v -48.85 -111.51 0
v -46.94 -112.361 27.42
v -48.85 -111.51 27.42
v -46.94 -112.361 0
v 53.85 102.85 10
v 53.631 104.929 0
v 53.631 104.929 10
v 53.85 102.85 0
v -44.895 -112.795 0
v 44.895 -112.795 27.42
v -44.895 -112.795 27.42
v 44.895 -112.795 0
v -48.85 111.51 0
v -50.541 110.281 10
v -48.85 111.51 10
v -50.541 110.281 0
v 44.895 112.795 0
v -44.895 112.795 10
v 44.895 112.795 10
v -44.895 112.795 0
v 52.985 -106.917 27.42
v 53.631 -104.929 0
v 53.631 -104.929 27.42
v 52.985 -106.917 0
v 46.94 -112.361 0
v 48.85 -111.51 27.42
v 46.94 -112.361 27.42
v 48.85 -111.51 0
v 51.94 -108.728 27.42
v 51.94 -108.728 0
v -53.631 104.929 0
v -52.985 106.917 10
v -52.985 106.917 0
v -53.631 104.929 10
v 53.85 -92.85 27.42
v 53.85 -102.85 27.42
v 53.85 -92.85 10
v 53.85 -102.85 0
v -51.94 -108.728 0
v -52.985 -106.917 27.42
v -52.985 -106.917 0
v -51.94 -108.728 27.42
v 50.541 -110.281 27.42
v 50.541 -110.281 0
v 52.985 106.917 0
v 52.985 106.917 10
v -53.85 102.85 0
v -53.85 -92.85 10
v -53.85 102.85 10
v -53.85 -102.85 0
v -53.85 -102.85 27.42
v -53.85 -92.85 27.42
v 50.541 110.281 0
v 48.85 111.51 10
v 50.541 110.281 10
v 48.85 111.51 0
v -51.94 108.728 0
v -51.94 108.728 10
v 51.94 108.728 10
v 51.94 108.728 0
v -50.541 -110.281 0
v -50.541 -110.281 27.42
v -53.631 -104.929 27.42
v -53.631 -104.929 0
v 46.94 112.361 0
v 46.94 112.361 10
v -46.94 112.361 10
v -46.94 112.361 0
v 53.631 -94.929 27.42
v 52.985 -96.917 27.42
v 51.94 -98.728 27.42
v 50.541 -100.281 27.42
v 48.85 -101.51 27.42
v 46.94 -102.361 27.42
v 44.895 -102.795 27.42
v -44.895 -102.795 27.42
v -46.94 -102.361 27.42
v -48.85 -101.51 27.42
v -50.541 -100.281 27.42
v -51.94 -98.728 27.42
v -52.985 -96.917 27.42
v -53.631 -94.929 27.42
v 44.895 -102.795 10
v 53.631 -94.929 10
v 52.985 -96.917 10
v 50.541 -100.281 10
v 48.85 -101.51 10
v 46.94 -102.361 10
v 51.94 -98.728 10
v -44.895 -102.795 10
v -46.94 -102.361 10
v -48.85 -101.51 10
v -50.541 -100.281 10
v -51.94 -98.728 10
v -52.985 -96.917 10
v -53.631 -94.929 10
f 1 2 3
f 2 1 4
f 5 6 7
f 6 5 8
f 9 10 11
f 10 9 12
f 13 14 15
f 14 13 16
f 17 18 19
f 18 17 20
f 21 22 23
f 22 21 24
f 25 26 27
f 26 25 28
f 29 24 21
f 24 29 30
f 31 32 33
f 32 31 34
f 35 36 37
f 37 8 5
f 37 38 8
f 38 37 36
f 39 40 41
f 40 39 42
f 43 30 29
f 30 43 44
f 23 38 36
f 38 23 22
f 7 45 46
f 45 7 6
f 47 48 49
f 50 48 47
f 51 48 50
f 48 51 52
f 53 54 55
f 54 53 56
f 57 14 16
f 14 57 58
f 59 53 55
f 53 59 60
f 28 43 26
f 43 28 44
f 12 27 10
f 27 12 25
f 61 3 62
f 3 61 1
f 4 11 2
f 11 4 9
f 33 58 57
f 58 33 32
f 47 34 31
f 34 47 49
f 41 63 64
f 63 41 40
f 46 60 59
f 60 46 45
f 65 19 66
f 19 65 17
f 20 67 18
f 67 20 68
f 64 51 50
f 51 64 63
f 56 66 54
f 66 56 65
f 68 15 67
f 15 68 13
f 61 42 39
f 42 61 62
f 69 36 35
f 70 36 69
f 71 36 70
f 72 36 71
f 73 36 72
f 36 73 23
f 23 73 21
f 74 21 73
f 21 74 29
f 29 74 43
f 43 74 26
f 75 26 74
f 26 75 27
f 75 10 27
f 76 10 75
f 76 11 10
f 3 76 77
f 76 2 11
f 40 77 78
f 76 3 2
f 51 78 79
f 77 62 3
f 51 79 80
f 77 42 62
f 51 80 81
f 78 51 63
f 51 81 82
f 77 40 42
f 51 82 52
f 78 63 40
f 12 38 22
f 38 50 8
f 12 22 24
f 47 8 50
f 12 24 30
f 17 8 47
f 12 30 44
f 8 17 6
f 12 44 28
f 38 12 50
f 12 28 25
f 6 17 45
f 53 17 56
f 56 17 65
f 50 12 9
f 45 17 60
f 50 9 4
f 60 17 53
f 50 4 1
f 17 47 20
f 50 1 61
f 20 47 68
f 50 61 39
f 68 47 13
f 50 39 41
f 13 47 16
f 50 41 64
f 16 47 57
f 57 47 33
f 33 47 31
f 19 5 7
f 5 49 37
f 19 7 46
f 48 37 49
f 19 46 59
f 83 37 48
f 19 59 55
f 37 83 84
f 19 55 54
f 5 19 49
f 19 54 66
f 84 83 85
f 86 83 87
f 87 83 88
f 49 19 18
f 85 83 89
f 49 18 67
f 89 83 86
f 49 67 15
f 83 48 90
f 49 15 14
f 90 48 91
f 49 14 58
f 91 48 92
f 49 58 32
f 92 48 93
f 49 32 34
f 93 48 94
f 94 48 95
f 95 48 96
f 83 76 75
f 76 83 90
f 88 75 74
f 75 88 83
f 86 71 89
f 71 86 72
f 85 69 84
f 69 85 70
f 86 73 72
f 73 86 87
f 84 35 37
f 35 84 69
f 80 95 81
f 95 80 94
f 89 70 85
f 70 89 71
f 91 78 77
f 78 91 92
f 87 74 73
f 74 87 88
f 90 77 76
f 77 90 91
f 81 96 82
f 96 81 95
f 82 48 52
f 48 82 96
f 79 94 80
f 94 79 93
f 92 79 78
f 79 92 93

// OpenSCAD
pad_corner_r = 10;
pad_x = 53.85;
pad_y = 107.85;
pad_z = 17.42;
pad_pins_offset_y = 6.5;

module rounded_box(size_x, size_y, size_z, radius) {
    hull() {
        translate([size_x-radius, size_y-radius, 0]) cylinder(r=radius, h=size_z);
        translate([size_x-radius, -size_y+radius, 0]) cylinder(r=radius, h=size_z);
        translate([-size_x+radius, size_y-radius, 0]) cylinder(r=radius, h=size_z);
        translate([-size_x+radius, -size_y+radius, 0]) cylinder(r=radius, h=size_z);
    }
}

module pad() {
    rounded_box(pad_x, pad_y, pad_z, pad_corner_r);
}

dock_back_z = 10;
dock_extra_bottom_lip_y = 5;

dock_x = pad_x;
dock_y = pad_y+dock_extra_bottom_lip_y;
dock_z = pad_z + dock_back_z;

// TODO add a cutout to house the pogo pin contacts once I settle on a part number.
module dock() {
    difference() {
        rounded_box(dock_x, dock_y, dock_z, pad_corner_r);
        translate([0,dock_extra_bottom_lip_y, dock_back_z]) pad();
    }
}

dock();
